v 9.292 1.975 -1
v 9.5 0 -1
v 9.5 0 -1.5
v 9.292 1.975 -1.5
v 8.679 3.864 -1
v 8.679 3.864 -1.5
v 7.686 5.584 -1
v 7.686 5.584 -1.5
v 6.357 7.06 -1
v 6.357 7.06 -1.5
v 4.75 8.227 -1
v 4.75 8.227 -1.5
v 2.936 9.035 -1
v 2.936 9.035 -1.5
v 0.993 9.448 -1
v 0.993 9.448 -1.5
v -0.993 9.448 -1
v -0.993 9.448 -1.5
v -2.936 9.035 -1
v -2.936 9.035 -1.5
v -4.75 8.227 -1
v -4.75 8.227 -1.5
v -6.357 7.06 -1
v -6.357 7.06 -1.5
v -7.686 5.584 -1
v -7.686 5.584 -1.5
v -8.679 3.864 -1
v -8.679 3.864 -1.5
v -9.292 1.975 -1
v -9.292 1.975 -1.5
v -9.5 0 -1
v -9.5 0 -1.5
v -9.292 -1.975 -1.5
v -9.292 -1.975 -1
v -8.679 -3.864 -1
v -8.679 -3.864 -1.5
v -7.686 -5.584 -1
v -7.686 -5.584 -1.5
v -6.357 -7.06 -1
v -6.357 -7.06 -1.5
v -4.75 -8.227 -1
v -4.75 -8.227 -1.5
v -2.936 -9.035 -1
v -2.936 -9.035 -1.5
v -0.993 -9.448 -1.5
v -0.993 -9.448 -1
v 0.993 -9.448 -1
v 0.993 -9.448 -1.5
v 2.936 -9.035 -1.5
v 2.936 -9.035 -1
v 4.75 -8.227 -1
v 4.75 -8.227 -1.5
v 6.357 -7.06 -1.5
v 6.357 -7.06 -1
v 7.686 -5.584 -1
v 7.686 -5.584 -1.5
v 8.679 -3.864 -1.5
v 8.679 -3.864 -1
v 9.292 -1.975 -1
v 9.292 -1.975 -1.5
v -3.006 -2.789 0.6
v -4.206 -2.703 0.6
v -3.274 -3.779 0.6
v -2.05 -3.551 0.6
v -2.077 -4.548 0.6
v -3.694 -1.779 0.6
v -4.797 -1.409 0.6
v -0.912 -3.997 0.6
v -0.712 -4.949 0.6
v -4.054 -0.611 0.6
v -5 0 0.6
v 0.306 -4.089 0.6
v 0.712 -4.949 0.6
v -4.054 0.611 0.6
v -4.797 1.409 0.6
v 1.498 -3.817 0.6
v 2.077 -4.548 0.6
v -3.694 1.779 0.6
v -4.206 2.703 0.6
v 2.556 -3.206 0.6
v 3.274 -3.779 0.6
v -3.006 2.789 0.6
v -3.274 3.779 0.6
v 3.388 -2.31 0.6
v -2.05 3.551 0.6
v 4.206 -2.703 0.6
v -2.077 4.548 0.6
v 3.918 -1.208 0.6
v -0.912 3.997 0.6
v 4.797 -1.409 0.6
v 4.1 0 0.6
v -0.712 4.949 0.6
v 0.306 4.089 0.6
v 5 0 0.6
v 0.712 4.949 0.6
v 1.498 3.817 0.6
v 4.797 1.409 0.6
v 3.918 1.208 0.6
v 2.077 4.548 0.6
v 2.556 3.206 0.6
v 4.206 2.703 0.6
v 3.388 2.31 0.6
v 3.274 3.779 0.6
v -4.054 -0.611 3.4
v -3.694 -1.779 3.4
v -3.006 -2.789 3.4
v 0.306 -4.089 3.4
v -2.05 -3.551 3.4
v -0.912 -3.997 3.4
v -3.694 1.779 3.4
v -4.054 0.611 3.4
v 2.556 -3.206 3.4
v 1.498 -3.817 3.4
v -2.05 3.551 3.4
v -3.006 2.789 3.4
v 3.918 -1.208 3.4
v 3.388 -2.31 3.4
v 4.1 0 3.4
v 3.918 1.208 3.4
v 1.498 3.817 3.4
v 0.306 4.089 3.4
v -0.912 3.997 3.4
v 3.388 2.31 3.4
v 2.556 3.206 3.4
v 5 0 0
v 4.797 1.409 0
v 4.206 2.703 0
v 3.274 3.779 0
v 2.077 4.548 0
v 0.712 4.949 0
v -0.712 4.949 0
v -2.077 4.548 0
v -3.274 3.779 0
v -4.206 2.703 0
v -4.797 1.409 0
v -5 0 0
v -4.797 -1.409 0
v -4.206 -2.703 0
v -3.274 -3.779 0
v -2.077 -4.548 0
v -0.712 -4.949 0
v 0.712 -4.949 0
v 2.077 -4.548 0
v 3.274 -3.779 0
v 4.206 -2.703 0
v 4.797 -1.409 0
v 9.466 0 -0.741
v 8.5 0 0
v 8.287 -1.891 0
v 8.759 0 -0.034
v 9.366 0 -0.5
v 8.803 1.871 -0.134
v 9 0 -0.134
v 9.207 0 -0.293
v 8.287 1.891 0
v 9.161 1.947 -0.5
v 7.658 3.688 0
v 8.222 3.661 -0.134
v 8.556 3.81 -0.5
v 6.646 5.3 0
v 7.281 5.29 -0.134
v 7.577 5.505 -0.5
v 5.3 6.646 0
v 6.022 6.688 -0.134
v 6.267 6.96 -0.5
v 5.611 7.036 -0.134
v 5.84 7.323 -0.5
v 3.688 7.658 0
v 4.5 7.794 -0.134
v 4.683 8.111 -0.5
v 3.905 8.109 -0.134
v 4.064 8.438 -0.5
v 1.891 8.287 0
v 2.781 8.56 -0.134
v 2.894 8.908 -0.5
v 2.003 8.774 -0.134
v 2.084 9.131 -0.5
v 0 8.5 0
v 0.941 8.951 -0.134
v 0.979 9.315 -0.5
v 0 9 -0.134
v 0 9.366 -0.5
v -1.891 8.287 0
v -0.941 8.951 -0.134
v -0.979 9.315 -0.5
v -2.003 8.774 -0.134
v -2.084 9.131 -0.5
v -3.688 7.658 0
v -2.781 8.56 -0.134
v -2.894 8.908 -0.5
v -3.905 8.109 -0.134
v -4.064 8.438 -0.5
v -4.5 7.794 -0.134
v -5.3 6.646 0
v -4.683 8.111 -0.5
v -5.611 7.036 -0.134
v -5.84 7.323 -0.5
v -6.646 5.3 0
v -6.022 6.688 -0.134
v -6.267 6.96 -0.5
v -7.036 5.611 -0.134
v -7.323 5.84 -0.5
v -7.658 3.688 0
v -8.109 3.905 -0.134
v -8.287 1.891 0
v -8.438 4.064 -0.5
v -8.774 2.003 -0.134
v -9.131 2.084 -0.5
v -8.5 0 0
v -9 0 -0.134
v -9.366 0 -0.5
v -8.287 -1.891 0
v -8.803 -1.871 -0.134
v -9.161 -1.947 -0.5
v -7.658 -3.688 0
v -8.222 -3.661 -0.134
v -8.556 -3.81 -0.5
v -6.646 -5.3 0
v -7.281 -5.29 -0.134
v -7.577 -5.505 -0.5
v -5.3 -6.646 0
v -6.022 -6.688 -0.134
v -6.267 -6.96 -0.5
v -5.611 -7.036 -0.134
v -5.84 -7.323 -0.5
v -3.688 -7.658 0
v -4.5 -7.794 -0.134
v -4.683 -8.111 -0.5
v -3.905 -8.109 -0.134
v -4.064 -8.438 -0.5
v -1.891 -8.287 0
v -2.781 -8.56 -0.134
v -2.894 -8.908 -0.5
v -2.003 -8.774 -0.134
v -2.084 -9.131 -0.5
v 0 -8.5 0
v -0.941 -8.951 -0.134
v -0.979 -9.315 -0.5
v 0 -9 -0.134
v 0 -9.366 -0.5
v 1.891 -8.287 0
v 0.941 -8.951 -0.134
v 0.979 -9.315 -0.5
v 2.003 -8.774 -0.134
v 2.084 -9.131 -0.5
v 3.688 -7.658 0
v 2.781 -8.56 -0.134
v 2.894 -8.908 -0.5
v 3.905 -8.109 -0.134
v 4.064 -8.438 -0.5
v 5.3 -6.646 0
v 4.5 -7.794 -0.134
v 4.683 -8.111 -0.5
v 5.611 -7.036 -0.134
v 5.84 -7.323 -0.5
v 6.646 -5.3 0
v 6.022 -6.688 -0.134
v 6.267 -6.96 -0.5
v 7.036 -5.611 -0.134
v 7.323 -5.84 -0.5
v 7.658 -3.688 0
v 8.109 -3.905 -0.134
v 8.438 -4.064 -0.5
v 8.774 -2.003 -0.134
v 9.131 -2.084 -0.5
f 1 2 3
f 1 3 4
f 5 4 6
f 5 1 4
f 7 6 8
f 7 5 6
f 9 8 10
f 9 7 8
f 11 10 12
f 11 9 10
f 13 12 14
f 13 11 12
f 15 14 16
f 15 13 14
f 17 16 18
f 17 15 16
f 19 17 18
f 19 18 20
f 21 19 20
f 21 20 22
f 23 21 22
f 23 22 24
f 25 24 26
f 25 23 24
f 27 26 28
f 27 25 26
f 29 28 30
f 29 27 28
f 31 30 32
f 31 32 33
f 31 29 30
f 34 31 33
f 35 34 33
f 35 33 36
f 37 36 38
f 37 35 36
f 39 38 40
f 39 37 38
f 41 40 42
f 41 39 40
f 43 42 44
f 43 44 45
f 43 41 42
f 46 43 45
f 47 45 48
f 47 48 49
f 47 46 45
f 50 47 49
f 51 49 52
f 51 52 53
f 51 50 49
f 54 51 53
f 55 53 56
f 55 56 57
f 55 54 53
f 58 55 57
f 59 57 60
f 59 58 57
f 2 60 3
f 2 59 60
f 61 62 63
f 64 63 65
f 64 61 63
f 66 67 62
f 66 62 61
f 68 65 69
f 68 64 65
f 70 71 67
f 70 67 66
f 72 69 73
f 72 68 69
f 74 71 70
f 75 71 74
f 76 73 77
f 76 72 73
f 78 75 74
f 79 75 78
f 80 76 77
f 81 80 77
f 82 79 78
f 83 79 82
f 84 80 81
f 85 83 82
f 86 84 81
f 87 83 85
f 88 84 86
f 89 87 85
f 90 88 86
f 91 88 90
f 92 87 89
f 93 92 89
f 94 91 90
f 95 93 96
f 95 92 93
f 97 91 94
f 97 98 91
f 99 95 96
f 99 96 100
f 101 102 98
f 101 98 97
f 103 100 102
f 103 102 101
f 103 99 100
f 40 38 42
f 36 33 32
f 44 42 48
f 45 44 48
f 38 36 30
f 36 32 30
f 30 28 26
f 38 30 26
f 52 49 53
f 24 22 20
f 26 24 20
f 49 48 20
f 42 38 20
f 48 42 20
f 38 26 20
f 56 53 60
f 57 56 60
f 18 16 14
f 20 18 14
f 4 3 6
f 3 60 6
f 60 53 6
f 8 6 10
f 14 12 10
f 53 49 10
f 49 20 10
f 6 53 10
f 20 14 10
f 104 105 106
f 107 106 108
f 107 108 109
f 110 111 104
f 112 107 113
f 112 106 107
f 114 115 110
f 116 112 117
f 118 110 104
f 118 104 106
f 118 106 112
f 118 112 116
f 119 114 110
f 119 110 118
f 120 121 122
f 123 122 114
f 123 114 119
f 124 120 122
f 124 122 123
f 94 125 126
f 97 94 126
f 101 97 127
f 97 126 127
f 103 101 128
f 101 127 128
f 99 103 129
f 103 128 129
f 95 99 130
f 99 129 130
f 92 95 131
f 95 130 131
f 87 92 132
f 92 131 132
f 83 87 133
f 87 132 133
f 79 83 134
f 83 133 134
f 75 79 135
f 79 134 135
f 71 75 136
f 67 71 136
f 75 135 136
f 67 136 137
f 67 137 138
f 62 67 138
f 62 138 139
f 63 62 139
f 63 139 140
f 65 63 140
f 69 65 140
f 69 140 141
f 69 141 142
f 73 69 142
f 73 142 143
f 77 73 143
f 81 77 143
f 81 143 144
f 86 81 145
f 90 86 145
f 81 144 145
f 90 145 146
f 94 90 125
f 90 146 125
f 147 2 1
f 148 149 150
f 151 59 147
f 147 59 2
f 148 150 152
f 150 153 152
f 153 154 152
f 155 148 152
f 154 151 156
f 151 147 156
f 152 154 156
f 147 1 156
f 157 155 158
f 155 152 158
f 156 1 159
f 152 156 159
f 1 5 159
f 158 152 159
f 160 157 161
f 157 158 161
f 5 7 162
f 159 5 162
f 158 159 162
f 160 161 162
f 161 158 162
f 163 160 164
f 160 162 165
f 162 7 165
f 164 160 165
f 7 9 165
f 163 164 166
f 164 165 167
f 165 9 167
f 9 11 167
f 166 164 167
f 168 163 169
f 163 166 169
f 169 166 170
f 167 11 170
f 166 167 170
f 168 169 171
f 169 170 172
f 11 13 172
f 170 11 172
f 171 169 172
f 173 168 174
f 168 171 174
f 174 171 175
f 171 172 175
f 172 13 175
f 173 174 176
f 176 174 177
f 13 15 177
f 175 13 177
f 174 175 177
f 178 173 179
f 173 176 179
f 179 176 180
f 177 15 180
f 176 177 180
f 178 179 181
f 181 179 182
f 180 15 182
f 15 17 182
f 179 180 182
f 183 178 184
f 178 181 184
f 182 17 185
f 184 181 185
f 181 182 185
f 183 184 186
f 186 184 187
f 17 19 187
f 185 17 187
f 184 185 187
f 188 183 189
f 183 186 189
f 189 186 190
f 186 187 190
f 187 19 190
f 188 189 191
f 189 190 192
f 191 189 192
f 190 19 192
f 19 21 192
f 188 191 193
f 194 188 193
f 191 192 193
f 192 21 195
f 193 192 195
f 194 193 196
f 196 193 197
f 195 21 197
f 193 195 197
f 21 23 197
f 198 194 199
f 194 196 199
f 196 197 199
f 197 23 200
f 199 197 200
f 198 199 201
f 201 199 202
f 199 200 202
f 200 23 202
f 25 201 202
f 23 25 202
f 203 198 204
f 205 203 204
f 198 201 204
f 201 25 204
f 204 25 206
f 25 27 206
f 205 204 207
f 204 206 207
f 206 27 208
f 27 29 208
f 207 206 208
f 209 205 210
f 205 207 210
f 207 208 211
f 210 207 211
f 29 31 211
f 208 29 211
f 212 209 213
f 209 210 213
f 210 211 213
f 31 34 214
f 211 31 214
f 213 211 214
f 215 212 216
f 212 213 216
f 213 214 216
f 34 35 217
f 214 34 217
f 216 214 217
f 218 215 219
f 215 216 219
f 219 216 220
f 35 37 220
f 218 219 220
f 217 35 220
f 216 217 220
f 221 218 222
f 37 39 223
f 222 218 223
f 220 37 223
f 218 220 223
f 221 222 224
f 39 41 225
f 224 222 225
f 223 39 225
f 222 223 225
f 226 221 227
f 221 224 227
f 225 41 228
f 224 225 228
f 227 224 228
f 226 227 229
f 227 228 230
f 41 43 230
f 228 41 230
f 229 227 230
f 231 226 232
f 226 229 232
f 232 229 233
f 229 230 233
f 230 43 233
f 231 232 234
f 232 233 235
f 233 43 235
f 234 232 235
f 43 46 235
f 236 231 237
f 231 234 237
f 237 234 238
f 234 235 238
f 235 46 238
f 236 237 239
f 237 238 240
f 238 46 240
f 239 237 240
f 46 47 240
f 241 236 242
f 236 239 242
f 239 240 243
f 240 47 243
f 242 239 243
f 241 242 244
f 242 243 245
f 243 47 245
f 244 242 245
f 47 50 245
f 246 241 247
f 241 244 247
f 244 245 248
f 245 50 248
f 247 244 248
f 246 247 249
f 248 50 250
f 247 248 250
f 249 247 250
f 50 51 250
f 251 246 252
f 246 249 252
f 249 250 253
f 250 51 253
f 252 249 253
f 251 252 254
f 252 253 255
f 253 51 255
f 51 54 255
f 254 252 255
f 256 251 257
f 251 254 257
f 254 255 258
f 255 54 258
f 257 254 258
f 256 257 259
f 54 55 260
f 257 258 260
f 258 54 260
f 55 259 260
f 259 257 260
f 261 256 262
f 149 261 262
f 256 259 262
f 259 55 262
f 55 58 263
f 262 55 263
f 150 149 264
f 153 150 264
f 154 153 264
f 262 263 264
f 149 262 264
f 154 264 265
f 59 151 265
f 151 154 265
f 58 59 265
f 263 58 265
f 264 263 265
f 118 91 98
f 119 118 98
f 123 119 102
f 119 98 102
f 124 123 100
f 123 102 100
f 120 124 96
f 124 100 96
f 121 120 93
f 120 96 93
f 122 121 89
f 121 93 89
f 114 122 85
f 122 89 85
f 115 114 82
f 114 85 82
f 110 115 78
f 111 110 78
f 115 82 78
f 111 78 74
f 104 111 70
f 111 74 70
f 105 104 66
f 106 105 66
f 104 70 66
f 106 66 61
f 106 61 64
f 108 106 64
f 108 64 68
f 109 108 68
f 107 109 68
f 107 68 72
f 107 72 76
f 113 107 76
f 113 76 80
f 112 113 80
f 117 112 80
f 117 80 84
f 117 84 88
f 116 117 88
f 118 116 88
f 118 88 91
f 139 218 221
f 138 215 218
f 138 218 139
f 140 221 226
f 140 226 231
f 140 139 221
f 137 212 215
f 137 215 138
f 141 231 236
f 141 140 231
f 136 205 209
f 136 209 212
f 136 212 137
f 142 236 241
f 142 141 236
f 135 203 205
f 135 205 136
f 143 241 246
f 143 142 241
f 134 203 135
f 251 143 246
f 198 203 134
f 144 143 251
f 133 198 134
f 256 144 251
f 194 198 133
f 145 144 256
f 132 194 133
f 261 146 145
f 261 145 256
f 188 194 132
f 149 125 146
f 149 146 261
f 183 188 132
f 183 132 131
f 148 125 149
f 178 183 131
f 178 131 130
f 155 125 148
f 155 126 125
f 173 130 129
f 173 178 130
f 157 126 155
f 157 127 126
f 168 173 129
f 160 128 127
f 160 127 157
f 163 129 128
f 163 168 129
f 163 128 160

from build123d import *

# Parameters (mm, degrees)
F0_R     = 9.5
F0_R_2   = 5
F0_R_3   = 4.1
F1_DEPTH = 1.5
F2_DEPTH = 3.4
F3_DEPTH = 0.6
F4_R     = 1


with BuildPart() as f1:
    # F0 (on Top) → F1 (new body)
    with BuildSketch(Plane.XY):
        Circle(F0_R)
        Circle(F0_R_2, mode=Mode.SUBTRACT)
        Circle(F0_R_2)
        Circle(F0_R_3, mode=Mode.SUBTRACT)
        Circle(F0_R_3)
    extrude(amount=-F1_DEPTH)

    # F0 (on Top) → F2 (join)
    with BuildSketch(Plane.XY):
        Circle(F0_R_3)
    extrude(amount=F2_DEPTH)

    # F0 (on Top) → F3 (join)
    with BuildSketch(Plane.XY):
        Circle(F0_R_2)
        Circle(F0_R_3, mode=Mode.SUBTRACT)
    extrude(amount=F3_DEPTH)

    # F4
    f4_edges = [f1.edges().sort_by_distance(p)[0] for p in [
        (-9.5, 0, 0),
    ]]
    fillet(f4_edges, radius=F4_R)


solid = f1.part
